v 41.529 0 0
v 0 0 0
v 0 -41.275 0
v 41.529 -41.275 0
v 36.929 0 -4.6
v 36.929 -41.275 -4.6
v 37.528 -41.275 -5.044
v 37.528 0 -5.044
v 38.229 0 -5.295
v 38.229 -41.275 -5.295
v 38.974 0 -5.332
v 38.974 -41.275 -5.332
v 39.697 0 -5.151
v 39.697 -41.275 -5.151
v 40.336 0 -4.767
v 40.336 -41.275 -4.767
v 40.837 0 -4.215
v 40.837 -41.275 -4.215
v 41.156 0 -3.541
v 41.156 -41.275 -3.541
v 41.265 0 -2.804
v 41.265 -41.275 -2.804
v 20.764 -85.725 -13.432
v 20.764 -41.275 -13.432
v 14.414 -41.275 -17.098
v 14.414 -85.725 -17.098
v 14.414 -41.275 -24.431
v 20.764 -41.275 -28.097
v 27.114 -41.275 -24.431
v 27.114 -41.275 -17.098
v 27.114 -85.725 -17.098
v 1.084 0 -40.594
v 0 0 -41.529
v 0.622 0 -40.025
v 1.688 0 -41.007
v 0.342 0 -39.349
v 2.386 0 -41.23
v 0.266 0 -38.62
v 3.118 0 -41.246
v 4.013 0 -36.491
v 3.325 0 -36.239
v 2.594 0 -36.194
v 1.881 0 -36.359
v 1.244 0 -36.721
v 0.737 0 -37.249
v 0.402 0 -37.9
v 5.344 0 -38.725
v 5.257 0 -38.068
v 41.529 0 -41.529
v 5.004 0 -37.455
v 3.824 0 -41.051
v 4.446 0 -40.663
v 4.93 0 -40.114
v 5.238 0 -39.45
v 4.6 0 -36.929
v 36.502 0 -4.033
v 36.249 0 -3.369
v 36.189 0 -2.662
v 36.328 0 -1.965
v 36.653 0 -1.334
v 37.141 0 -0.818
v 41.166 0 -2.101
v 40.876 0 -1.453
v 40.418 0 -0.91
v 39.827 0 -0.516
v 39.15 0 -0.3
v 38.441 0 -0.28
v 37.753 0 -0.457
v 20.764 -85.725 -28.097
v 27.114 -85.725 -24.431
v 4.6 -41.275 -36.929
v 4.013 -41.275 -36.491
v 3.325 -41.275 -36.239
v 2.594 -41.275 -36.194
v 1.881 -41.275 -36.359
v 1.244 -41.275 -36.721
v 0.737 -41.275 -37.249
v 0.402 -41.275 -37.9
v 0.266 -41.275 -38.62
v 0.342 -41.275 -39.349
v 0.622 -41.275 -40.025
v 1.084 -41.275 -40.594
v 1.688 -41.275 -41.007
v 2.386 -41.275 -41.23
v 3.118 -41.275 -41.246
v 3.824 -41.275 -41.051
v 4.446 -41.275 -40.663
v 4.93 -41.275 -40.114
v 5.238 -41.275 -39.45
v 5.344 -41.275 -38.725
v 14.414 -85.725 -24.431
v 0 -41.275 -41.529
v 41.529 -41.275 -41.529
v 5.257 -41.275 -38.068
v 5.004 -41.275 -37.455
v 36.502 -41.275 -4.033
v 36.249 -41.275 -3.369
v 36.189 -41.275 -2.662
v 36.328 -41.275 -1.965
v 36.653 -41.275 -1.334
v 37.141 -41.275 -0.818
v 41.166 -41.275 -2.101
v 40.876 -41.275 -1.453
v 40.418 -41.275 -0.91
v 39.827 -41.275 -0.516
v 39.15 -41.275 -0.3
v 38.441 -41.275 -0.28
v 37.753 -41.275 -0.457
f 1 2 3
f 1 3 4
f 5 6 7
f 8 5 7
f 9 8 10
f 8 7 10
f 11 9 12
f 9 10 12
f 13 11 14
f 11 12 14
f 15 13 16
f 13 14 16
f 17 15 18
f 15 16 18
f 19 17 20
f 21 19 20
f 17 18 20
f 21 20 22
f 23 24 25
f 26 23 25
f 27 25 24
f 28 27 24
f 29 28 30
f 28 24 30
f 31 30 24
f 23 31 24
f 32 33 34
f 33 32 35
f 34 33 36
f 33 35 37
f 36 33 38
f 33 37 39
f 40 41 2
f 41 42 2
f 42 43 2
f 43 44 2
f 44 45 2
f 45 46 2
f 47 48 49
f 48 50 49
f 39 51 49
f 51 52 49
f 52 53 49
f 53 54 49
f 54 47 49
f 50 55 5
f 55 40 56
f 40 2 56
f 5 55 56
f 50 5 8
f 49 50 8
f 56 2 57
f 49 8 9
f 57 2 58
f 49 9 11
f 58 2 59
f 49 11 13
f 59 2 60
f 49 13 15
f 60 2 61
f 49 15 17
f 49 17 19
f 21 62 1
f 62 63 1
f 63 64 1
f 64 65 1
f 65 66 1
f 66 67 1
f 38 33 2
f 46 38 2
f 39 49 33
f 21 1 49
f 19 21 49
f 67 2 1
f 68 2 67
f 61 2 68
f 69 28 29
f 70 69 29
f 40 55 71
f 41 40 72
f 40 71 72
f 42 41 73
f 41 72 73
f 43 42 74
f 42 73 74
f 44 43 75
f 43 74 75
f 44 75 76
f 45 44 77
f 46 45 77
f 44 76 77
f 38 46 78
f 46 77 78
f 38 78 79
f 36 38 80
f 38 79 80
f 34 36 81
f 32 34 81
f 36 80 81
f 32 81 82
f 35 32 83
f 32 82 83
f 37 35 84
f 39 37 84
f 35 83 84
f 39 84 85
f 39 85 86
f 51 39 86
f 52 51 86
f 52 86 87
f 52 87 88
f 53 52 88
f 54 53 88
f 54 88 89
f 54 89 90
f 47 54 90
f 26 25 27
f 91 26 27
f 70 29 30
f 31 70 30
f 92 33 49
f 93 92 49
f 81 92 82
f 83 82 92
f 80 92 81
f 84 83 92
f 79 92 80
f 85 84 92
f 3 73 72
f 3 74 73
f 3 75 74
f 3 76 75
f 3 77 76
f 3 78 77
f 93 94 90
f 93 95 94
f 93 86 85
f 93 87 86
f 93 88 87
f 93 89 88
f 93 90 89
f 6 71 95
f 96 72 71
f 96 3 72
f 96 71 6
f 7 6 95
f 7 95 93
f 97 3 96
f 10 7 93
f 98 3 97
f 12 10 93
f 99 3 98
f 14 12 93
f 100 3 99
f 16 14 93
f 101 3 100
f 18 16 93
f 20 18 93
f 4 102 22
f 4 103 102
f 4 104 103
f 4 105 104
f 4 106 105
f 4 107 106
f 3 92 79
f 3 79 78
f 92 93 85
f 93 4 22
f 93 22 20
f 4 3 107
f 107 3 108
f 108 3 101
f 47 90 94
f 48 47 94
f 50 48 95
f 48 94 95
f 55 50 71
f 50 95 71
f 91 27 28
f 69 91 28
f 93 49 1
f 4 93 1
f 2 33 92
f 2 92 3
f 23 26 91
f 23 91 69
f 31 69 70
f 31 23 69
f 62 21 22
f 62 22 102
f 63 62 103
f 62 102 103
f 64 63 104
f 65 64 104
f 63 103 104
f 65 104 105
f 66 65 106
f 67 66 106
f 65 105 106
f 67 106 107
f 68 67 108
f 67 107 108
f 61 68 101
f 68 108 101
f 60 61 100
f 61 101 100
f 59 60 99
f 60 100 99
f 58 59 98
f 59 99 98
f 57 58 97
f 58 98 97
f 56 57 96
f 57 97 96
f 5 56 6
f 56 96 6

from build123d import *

# Parameters (mm, degrees)
F0_W     = 41.529
F0_H     = 41.529
F1_DEPTH = 41.275
F3_DEPTH = 44.45
F5_DEPTH = 127


with BuildPart() as f1:
    # F0 (on Front) → F1 (new body)
    with BuildSketch(Plane.XZ):
        with Locations((20.7645, -20.7645)):
            Rectangle(F0_W, F0_H)
    extrude(amount=F1_DEPTH)

    # F4 (on face) → F5 (cut)
    with BuildSketch(Plane.XZ.offset(41.275)):
        with BuildLine():
            ThreePointArc((5.343988, -38.725012), (5.150642, -37.752996), (4.600039, -36.928961))
            ThreePointArc((4.600039, -36.928961), (0.457334, -39.697028), (5.343988, -38.725012))
        make_face()
        with BuildLine():
            ThreePointArc((36.928961, -4.600039), (39.697028, -5.150642), (41.265012, -2.803988))
            ThreePointArc((41.265012, -2.803988), (37.752996, -0.457334), (36.928961, -4.600039))
        make_face()
    extrude(amount=-F5_DEPTH, mode=Mode.SUBTRACT)


with BuildPart() as f3:
    # F2 (on face) → F3 (new body)
    with BuildSketch(Plane.XZ.offset(41.275)):
        Polygon((20.7645, -13.432152), (20.7645, -20.7645), (27.1145, -20.7645), (27.1145, -17.098326), align=None)
        Polygon((27.1145, -20.7645), (20.7645, -20.7645), (14.4145, -20.7645), (14.4145, -24.430674), (20.7645, -28.096848), (27.1145, -24.430674), align=None)
        Polygon((14.4145, -20.7645), (20.7645, -20.7645), (20.7645, -13.432152), (14.4145, -17.098326), align=None)
    extrude(amount=F3_DEPTH)


solid = Compound([f1.part, f3.part])
